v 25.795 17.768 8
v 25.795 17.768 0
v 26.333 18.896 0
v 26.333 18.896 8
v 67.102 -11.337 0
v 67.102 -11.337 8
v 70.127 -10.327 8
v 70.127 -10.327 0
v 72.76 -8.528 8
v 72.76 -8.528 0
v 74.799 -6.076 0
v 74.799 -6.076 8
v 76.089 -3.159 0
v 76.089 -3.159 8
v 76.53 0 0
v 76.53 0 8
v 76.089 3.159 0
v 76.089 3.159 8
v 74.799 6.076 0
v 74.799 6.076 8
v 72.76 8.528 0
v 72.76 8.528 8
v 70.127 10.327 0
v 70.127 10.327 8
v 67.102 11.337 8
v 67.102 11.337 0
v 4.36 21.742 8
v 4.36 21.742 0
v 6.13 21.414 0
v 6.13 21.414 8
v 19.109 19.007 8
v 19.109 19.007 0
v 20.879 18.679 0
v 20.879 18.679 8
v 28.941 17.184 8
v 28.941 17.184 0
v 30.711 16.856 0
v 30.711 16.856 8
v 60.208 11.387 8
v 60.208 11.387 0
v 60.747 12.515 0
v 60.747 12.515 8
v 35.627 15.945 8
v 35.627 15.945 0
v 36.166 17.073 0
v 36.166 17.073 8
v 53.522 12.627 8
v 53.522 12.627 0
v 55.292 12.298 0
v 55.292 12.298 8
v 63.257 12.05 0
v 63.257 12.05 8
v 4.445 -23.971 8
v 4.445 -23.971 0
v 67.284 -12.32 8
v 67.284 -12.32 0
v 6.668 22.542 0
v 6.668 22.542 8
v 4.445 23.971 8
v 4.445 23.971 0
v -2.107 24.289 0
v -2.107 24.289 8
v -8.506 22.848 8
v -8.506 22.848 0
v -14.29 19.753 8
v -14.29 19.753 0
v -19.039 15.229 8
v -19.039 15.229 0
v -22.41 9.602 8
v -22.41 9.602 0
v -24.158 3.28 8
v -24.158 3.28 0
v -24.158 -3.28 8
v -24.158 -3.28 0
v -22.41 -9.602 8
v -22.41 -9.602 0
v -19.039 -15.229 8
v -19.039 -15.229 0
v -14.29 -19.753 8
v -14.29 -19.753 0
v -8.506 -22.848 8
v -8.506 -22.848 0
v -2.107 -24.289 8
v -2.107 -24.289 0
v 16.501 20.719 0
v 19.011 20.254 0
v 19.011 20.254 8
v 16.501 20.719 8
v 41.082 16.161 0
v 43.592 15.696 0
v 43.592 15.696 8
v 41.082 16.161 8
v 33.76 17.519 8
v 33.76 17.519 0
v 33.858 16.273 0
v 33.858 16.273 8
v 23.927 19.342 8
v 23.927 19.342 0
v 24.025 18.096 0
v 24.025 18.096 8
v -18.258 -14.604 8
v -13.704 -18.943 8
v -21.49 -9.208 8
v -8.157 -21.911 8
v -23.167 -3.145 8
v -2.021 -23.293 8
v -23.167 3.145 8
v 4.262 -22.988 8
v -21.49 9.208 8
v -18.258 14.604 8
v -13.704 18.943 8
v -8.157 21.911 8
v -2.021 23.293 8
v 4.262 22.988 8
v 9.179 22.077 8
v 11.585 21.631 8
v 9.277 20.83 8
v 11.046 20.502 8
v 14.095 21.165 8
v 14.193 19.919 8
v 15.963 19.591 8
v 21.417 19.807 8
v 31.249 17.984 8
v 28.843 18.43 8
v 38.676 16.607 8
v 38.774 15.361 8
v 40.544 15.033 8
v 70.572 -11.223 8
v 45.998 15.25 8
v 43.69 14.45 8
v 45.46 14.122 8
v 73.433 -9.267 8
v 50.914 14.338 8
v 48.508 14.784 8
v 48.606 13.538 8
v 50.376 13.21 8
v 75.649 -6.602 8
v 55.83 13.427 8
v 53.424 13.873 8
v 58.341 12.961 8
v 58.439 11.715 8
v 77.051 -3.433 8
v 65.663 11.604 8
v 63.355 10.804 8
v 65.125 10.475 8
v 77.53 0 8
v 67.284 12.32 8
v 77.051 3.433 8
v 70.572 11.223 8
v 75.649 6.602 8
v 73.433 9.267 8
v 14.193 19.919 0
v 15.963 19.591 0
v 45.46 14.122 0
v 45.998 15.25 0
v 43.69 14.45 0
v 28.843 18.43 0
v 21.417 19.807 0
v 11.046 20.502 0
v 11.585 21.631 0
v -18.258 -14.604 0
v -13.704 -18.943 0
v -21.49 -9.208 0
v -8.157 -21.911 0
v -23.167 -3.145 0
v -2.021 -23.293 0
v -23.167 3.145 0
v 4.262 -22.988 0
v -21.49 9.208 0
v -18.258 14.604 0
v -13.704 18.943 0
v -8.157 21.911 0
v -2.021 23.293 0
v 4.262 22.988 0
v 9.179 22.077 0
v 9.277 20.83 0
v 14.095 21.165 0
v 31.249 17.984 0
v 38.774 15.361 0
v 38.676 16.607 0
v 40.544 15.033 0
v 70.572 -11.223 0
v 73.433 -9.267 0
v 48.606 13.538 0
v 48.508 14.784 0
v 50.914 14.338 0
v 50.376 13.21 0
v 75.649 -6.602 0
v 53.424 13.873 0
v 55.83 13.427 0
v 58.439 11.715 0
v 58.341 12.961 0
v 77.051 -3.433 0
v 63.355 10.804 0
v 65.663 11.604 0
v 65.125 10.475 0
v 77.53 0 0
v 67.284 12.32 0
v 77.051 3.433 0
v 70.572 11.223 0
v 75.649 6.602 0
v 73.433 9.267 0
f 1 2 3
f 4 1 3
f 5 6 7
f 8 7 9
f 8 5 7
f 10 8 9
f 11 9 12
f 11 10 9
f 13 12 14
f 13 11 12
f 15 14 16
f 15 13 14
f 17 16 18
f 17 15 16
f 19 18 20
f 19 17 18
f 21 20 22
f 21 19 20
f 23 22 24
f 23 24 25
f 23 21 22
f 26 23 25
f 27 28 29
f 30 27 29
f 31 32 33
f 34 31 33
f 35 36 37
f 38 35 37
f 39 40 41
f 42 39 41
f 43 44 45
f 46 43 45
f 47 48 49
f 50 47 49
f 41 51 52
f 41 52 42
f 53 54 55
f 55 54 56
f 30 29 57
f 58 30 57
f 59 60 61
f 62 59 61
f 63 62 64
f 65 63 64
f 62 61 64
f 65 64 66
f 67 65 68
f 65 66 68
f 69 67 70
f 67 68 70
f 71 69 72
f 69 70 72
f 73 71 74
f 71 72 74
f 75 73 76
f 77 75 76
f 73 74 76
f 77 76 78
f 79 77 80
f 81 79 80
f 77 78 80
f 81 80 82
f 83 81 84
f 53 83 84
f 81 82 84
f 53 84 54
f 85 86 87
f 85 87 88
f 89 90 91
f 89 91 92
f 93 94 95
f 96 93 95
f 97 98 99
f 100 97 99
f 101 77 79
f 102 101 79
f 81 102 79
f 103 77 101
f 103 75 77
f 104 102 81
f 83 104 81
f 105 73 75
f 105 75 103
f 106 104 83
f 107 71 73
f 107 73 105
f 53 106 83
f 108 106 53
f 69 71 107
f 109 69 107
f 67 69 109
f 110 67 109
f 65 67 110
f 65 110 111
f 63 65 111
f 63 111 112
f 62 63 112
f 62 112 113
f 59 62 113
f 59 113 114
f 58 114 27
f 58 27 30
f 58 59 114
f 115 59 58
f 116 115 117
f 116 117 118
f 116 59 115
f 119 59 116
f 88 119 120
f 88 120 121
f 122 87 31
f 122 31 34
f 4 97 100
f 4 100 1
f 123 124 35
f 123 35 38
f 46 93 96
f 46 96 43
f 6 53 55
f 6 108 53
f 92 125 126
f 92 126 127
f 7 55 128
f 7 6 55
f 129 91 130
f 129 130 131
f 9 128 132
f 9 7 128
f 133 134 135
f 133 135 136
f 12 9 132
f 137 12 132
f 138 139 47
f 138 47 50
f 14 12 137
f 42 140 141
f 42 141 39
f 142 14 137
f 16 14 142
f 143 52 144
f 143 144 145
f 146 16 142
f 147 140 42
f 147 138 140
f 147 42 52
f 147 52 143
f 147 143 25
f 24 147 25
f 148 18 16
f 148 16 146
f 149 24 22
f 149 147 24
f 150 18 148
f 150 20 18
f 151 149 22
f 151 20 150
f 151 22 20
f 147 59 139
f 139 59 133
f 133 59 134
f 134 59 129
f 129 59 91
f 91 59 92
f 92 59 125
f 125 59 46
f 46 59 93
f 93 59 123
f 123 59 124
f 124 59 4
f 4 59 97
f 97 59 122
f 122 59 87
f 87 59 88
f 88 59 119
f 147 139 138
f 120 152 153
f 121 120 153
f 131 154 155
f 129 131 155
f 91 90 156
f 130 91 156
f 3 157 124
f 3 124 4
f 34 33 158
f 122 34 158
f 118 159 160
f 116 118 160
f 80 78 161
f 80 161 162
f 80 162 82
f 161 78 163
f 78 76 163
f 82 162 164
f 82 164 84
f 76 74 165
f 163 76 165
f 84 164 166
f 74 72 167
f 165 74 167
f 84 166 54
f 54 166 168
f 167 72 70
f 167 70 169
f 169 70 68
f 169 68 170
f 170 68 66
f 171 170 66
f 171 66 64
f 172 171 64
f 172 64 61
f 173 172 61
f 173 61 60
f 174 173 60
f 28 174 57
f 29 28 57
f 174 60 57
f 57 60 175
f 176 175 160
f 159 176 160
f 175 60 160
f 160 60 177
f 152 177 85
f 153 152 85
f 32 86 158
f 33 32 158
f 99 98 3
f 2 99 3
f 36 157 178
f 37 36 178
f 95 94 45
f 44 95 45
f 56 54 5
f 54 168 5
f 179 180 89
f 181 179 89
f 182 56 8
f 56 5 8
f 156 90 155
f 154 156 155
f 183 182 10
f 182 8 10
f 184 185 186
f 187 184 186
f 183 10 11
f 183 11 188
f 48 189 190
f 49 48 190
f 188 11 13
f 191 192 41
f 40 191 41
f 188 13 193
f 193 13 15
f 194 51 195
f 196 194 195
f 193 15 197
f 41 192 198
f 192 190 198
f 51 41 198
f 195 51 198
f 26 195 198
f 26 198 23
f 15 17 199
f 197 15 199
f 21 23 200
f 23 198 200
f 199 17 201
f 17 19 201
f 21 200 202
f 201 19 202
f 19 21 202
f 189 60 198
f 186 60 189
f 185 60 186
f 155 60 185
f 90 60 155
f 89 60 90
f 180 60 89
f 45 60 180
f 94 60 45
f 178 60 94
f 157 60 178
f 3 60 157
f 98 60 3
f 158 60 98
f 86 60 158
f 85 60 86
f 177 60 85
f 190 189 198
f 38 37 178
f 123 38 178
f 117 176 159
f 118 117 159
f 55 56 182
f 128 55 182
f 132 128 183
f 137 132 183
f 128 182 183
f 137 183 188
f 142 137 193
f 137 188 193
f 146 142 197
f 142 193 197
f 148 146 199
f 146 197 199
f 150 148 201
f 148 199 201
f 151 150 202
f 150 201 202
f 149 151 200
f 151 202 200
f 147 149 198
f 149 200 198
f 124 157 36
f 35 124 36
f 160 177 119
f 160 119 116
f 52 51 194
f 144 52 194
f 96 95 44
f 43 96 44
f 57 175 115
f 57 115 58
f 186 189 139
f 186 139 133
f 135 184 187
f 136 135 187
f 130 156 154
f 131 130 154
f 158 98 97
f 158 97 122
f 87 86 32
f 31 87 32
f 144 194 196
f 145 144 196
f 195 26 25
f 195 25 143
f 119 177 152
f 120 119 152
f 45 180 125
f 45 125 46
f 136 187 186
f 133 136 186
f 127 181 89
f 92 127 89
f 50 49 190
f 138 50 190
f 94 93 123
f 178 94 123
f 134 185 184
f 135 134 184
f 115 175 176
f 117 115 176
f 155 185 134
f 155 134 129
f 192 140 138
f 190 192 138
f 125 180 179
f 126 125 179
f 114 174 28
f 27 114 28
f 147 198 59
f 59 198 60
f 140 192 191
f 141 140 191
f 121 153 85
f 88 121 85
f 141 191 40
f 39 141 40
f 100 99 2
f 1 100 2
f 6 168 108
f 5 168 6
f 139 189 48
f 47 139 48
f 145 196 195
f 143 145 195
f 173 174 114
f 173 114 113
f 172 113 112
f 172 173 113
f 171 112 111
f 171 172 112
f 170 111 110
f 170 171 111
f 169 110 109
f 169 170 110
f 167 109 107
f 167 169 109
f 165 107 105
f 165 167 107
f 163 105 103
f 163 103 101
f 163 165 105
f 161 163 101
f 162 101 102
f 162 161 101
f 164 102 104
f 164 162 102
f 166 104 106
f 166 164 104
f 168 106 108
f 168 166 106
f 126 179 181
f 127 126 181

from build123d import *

# Parameters (mm, degrees)
BOSS_EXTRUDE1_DEPTH = 8
BOSS_EXTRUDE2_DEPTH = 8
CRVPATTERN1_COUNT   = 48
CRVPATTERN1_PITCH   = 5


with BuildPart() as part:
    # Sketch2 → Boss-Extrude1 (new body)
    with BuildSketch(Plane.XY):
        with BuildLine():
            Line((67.284315385, 12.320016365), (4.444661538, 23.971428489))
            ThreePointArc((4.444661538, 23.971428489), (-24.38, 0), (4.444661538, -23.971428489))
            Line((4.444661538, -23.971428489), (67.284315385, -12.320016365))
            ThreePointArc((67.284315385, -12.320016365), (77.53, 0), (67.284315385, 12.320016365))
        make_face()
        with BuildLine():
            Line((4.262353846, -22.98818696), (67.102007692, -11.336774835))
            ThreePointArc((67.102007692, -11.336774835), (76.53, 0), (67.102007692, 11.336774835))
            Line((67.102007692, 11.336774835), (4.262353846, 22.98818696))
            ThreePointArc((4.262353846, 22.98818696), (-23.38, 0), (4.262353846, -22.98818696))
        make_face(mode=Mode.SUBTRACT)
    extrude(amount=BOSS_EXTRUDE1_DEPTH)

    # Sketch4 → Boss-Extrude2 (add)
    with BuildSketch(Plane.XY):
        Polygon((4.262353846, 22.98818696), (4.360336253, 21.742033098), (6.130171006, 21.413879251), (6.668392684, 22.542071356), align=None)
    boss_extrude2 = extrude(amount=BOSS_EXTRUDE2_DEPTH)

    # CrvPattern1: Boss-Extrude2 ×48, 35 skipped
    with Locations(*[Vector(0.9832415295345763, -0.18230769209911846, 0) * (i * CRVPATTERN1_PITCH) for i in range(1, CRVPATTERN1_COUNT) if i not in (13, 14, 15, 16, 17, 18, 19, 20, 21, 22, 23, 24, 25, 26, 27, 28, 29, 30, 31, 32, 33, 34, 35, 36, 37, 38, 39, 40, 41, 42, 43, 44, 45, 46, 47)]):
        add(boss_extrude2)


solid = part.part
